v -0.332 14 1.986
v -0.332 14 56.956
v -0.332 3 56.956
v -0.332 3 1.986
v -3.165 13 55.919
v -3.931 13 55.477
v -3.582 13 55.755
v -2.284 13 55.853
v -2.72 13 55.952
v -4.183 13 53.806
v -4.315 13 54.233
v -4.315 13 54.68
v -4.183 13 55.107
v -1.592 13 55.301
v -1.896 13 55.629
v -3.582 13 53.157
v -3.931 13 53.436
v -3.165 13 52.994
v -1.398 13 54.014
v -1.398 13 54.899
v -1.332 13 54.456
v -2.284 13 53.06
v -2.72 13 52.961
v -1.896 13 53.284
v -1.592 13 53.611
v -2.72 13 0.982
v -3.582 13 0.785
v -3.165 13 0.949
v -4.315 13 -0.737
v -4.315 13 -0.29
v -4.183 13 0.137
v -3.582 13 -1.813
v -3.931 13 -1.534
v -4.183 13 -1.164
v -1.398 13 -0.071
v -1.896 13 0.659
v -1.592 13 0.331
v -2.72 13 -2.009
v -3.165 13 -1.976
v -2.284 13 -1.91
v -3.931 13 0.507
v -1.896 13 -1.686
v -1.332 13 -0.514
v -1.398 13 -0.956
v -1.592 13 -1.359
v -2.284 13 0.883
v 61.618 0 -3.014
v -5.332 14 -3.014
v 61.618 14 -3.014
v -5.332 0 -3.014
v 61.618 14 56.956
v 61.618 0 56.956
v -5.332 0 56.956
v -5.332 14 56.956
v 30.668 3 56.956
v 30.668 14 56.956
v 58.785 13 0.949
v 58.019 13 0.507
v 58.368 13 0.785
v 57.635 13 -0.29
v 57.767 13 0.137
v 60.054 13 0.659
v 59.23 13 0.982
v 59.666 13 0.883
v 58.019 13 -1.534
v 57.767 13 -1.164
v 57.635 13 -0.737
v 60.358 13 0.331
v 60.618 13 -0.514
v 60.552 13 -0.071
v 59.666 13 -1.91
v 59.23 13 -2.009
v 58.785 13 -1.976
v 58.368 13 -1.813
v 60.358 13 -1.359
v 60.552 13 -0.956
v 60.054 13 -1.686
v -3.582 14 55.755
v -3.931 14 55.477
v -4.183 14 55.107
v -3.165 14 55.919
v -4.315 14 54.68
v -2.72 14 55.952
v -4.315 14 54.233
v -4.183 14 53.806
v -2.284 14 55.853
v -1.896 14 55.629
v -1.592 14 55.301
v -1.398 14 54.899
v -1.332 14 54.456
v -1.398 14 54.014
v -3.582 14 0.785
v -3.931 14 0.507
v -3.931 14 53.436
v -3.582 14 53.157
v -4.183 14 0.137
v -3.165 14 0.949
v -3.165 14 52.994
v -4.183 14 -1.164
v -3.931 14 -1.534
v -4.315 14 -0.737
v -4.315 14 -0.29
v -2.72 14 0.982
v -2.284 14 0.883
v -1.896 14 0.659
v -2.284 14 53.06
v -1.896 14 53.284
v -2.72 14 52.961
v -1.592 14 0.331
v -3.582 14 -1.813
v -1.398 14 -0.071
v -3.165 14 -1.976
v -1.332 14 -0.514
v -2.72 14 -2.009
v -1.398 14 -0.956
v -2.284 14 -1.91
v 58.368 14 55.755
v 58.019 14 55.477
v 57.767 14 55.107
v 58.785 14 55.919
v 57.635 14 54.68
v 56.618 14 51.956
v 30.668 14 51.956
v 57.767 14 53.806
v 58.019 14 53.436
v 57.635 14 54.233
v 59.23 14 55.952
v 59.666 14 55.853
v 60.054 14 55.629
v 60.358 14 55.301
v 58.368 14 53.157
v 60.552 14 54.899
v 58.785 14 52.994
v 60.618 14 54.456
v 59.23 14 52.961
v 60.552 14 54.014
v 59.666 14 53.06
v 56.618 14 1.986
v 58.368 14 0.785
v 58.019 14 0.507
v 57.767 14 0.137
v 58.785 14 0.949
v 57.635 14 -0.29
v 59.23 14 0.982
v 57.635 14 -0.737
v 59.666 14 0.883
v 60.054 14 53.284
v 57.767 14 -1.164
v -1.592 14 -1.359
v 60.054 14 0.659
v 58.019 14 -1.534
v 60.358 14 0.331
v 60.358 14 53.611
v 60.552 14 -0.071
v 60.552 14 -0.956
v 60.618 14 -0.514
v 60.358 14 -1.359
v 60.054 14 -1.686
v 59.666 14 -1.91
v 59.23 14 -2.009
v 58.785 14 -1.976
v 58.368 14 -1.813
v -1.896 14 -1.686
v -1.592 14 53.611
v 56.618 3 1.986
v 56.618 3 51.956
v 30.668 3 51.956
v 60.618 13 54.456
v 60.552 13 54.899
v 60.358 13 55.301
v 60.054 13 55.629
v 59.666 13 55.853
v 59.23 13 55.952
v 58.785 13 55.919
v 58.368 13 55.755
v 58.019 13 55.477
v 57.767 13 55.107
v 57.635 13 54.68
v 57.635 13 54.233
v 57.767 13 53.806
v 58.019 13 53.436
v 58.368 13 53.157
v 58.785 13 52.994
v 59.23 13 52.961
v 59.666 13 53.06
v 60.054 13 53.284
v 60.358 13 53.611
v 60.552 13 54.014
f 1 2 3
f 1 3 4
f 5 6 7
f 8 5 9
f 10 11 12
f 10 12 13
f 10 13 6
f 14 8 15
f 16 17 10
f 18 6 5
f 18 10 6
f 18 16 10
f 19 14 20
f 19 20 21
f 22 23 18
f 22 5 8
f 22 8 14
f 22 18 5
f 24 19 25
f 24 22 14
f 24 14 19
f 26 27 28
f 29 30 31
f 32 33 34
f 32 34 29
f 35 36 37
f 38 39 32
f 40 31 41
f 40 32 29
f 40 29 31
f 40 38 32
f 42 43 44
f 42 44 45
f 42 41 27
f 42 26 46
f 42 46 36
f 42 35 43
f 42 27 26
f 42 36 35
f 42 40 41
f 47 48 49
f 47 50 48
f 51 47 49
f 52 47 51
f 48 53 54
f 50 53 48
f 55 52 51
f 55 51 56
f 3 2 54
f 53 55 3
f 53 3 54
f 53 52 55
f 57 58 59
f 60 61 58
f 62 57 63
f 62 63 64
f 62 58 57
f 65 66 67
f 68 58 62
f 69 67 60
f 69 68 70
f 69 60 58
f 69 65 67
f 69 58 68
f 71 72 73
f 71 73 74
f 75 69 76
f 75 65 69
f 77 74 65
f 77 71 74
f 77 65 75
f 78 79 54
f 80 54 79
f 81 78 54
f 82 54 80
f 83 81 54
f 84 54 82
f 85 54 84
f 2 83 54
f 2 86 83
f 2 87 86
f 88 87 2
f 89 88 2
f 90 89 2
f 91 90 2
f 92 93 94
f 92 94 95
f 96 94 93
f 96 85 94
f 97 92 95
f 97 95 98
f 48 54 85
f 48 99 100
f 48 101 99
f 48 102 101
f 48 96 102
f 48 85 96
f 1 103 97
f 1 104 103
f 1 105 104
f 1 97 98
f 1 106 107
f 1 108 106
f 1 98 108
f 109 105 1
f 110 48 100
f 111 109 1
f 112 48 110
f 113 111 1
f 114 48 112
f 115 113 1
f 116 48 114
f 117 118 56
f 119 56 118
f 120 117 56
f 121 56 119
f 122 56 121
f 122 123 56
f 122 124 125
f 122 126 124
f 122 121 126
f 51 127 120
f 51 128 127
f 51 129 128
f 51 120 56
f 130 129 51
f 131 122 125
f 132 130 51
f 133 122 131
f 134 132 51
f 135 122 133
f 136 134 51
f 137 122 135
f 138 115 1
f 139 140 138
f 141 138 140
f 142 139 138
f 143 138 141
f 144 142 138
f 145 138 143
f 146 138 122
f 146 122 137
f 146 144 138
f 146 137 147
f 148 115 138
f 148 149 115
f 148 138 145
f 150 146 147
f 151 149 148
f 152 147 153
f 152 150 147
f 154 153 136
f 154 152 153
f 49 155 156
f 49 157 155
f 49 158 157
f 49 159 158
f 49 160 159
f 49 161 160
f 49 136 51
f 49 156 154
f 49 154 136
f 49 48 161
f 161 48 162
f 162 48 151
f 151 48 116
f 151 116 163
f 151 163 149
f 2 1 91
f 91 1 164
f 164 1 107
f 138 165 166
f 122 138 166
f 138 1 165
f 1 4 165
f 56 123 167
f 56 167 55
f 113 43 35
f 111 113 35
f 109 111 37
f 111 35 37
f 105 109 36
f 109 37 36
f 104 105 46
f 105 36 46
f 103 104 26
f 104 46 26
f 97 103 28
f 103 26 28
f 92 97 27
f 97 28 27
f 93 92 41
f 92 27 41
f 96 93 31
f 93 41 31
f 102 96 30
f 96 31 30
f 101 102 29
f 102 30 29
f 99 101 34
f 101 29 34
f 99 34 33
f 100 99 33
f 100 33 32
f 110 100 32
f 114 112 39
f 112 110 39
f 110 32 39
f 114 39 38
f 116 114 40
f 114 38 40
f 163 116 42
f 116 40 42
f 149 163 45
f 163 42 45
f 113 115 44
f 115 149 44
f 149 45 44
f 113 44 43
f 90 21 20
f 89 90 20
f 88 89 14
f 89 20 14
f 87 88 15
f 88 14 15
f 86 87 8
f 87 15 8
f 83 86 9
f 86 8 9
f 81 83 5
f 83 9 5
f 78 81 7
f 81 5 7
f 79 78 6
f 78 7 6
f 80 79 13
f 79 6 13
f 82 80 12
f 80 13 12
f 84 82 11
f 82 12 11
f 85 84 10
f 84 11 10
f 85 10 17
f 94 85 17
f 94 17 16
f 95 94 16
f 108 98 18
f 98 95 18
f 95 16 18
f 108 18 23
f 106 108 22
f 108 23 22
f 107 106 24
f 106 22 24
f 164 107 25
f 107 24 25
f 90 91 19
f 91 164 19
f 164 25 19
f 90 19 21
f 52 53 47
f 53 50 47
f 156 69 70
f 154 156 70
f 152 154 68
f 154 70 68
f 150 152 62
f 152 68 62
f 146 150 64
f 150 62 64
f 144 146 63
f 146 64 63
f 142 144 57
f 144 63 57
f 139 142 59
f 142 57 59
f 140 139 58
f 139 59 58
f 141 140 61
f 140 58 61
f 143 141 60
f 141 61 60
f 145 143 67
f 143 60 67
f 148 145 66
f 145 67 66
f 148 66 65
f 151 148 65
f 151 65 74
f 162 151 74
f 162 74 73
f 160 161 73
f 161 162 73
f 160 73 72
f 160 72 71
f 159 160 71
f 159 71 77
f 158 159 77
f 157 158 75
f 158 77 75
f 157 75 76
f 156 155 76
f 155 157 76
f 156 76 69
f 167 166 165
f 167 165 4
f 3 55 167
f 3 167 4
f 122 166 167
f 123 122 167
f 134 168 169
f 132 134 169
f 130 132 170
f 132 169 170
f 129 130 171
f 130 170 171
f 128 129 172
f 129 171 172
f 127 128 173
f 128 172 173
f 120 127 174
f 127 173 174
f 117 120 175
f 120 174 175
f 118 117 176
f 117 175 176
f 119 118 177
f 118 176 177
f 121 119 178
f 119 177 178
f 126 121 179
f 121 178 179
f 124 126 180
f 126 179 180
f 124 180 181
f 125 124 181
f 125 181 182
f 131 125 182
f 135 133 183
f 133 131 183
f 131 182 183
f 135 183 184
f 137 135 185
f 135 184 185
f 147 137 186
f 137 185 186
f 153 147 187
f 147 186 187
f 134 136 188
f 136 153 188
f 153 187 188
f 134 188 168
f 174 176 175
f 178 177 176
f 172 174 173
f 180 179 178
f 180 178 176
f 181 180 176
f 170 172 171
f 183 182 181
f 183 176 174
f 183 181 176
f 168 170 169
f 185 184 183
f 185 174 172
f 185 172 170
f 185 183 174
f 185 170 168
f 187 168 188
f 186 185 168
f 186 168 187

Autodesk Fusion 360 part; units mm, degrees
sketch "Sketch1" plane through (0, 0, 0) normal (0, 1, 0) x (1, 0, 0)
  line L0 (-0.3317, -1.9864) -> (56.6183, -1.9864)
  line L1 (56.6183, -1.9864) -> (56.6183, -51.9564)
  line L2 (56.6183, -51.9564) -> (-0.3317, -51.9564)
  line L3 (-0.3317, -51.9564) -> (-0.3317, -1.9864)
  line L4 (-5.3317, 3.0136) -> (61.6183, 3.0136)
  line L5 (61.6183, 3.0136) -> (61.6183, -56.9564)
  line L6 (61.6183, -56.9564) -> (-5.3317, -56.9564)
  line L7 (-5.3317, -56.9564) -> (-5.3317, 3.0136)
  circle A0 centre (59.1183, -54.4564) radius 1.5
  circle A1 centre (-2.8317, -54.4564) radius 1.5
  circle A2 centre (-2.8317, 0.5136) radius 1.5
  circle A3 centre (59.1183, 0.5136) radius 1.5
  circle A4 centre (-2.8317, -54.4564) radius 2
  circle A5 centre (59.1183, -54.4564) radius 2
  circle A6 centre (59.1183, 0.5136) radius 2
  circle A7 centre (-2.8317, 0.5136) radius 2
  dimension "d2" = 49.97
  dimension "d3" = 66.95
  dimension "d4" = 59.97
  dimension "d5" = 5
  dimension "d6" = 5
  dimension "d7" = 3
  dimension "d8" = 3
  dimension "d9" = 3
  dimension "d10" = 3
  dimension "d11" = 2.5
  dimension "d12" = 2.5
  dimension "d13" = 2.5
  dimension "d14" = 2.5
  dimension "d15" = 2.5
  dimension "d16" = 2.5
  dimension "d17" = 2.5
  dimension "d18" = 2.5
  dimension "d19" = 4
  dimension "d20" = 4
  dimension "d21" = 4
  dimension "d22" = 4
extrude "Extrude1" add sketch "Sketch1" along normal blind 3 contours L0 L1 L2 L3
extrude "Extrude2" add sketch "Sketch1" along normal blind 14 contours L4 L5 L6 L7 | A4 | A5 | A6 | A7
extrude "Extrude3" add sketch "Sketch1" along normal blind 13 contours A0 | A1 | A2 | A3
sketch "Sketch2" plane through (0, 14, 0) normal (0, 1, 0) x (-1, 0, 0)
  circle A0 centre (2.8317, 54.4564) radius 1.5
  circle A1 centre (-59.1183, -0.5136) radius 1.5
  circle A2 centre (-59.1183, 54.4564) radius 1.5
  line L0 (-56.6183, 51.9564) -> (0.3317, 51.9564)
  line L1 (0.3317, 51.9564) -> (0.3317, 1.9864)
  line L2 (0.3317, 1.9864) -> (-56.6183, 1.9864)
  line L3 (-56.6183, 1.9864) -> (-56.6183, 51.9564)
  circle A3 centre (2.8317, -0.5136) radius 1.5
  line L4 (5.3317, 56.9564) -> (-61.6183, 56.9564)
  line L5 (-61.6183, 56.9564) -> (-61.6183, -3.0136)
  line L6 (-61.6183, -3.0136) -> (5.3317, -3.0136)
  line L7 (5.3317, -3.0136) -> (5.3317, 56.9564)
  line L8 (0.3317, 1.9864) -> (-30.6683, 1.9864)
  line L9 (-30.6683, 1.9864) -> (-30.6683, -3.0136)
  line L10 (-30.6683, -3.0136) -> (0.3317, -3.0136)
  line L11 (0.3317, -3.0136) -> (0.3317, 1.9864)
  line L12 (0.3317, 51.9564) -> (-30.6683, 51.9564)
  line L13 (-30.6683, 51.9564) -> (-30.6683, 56.9564)
  line L14 (-30.6683, 56.9564) -> (0.3317, 56.9564)
  line L15 (0.3317, 56.9564) -> (0.3317, 51.9564)
  dimension "d29" = 31
  dimension "d30" = 31
extrude "Extrude4" cut sketch "Sketch2" against normal blind 11 contours L0 L4 L12 L13 L14 L15
